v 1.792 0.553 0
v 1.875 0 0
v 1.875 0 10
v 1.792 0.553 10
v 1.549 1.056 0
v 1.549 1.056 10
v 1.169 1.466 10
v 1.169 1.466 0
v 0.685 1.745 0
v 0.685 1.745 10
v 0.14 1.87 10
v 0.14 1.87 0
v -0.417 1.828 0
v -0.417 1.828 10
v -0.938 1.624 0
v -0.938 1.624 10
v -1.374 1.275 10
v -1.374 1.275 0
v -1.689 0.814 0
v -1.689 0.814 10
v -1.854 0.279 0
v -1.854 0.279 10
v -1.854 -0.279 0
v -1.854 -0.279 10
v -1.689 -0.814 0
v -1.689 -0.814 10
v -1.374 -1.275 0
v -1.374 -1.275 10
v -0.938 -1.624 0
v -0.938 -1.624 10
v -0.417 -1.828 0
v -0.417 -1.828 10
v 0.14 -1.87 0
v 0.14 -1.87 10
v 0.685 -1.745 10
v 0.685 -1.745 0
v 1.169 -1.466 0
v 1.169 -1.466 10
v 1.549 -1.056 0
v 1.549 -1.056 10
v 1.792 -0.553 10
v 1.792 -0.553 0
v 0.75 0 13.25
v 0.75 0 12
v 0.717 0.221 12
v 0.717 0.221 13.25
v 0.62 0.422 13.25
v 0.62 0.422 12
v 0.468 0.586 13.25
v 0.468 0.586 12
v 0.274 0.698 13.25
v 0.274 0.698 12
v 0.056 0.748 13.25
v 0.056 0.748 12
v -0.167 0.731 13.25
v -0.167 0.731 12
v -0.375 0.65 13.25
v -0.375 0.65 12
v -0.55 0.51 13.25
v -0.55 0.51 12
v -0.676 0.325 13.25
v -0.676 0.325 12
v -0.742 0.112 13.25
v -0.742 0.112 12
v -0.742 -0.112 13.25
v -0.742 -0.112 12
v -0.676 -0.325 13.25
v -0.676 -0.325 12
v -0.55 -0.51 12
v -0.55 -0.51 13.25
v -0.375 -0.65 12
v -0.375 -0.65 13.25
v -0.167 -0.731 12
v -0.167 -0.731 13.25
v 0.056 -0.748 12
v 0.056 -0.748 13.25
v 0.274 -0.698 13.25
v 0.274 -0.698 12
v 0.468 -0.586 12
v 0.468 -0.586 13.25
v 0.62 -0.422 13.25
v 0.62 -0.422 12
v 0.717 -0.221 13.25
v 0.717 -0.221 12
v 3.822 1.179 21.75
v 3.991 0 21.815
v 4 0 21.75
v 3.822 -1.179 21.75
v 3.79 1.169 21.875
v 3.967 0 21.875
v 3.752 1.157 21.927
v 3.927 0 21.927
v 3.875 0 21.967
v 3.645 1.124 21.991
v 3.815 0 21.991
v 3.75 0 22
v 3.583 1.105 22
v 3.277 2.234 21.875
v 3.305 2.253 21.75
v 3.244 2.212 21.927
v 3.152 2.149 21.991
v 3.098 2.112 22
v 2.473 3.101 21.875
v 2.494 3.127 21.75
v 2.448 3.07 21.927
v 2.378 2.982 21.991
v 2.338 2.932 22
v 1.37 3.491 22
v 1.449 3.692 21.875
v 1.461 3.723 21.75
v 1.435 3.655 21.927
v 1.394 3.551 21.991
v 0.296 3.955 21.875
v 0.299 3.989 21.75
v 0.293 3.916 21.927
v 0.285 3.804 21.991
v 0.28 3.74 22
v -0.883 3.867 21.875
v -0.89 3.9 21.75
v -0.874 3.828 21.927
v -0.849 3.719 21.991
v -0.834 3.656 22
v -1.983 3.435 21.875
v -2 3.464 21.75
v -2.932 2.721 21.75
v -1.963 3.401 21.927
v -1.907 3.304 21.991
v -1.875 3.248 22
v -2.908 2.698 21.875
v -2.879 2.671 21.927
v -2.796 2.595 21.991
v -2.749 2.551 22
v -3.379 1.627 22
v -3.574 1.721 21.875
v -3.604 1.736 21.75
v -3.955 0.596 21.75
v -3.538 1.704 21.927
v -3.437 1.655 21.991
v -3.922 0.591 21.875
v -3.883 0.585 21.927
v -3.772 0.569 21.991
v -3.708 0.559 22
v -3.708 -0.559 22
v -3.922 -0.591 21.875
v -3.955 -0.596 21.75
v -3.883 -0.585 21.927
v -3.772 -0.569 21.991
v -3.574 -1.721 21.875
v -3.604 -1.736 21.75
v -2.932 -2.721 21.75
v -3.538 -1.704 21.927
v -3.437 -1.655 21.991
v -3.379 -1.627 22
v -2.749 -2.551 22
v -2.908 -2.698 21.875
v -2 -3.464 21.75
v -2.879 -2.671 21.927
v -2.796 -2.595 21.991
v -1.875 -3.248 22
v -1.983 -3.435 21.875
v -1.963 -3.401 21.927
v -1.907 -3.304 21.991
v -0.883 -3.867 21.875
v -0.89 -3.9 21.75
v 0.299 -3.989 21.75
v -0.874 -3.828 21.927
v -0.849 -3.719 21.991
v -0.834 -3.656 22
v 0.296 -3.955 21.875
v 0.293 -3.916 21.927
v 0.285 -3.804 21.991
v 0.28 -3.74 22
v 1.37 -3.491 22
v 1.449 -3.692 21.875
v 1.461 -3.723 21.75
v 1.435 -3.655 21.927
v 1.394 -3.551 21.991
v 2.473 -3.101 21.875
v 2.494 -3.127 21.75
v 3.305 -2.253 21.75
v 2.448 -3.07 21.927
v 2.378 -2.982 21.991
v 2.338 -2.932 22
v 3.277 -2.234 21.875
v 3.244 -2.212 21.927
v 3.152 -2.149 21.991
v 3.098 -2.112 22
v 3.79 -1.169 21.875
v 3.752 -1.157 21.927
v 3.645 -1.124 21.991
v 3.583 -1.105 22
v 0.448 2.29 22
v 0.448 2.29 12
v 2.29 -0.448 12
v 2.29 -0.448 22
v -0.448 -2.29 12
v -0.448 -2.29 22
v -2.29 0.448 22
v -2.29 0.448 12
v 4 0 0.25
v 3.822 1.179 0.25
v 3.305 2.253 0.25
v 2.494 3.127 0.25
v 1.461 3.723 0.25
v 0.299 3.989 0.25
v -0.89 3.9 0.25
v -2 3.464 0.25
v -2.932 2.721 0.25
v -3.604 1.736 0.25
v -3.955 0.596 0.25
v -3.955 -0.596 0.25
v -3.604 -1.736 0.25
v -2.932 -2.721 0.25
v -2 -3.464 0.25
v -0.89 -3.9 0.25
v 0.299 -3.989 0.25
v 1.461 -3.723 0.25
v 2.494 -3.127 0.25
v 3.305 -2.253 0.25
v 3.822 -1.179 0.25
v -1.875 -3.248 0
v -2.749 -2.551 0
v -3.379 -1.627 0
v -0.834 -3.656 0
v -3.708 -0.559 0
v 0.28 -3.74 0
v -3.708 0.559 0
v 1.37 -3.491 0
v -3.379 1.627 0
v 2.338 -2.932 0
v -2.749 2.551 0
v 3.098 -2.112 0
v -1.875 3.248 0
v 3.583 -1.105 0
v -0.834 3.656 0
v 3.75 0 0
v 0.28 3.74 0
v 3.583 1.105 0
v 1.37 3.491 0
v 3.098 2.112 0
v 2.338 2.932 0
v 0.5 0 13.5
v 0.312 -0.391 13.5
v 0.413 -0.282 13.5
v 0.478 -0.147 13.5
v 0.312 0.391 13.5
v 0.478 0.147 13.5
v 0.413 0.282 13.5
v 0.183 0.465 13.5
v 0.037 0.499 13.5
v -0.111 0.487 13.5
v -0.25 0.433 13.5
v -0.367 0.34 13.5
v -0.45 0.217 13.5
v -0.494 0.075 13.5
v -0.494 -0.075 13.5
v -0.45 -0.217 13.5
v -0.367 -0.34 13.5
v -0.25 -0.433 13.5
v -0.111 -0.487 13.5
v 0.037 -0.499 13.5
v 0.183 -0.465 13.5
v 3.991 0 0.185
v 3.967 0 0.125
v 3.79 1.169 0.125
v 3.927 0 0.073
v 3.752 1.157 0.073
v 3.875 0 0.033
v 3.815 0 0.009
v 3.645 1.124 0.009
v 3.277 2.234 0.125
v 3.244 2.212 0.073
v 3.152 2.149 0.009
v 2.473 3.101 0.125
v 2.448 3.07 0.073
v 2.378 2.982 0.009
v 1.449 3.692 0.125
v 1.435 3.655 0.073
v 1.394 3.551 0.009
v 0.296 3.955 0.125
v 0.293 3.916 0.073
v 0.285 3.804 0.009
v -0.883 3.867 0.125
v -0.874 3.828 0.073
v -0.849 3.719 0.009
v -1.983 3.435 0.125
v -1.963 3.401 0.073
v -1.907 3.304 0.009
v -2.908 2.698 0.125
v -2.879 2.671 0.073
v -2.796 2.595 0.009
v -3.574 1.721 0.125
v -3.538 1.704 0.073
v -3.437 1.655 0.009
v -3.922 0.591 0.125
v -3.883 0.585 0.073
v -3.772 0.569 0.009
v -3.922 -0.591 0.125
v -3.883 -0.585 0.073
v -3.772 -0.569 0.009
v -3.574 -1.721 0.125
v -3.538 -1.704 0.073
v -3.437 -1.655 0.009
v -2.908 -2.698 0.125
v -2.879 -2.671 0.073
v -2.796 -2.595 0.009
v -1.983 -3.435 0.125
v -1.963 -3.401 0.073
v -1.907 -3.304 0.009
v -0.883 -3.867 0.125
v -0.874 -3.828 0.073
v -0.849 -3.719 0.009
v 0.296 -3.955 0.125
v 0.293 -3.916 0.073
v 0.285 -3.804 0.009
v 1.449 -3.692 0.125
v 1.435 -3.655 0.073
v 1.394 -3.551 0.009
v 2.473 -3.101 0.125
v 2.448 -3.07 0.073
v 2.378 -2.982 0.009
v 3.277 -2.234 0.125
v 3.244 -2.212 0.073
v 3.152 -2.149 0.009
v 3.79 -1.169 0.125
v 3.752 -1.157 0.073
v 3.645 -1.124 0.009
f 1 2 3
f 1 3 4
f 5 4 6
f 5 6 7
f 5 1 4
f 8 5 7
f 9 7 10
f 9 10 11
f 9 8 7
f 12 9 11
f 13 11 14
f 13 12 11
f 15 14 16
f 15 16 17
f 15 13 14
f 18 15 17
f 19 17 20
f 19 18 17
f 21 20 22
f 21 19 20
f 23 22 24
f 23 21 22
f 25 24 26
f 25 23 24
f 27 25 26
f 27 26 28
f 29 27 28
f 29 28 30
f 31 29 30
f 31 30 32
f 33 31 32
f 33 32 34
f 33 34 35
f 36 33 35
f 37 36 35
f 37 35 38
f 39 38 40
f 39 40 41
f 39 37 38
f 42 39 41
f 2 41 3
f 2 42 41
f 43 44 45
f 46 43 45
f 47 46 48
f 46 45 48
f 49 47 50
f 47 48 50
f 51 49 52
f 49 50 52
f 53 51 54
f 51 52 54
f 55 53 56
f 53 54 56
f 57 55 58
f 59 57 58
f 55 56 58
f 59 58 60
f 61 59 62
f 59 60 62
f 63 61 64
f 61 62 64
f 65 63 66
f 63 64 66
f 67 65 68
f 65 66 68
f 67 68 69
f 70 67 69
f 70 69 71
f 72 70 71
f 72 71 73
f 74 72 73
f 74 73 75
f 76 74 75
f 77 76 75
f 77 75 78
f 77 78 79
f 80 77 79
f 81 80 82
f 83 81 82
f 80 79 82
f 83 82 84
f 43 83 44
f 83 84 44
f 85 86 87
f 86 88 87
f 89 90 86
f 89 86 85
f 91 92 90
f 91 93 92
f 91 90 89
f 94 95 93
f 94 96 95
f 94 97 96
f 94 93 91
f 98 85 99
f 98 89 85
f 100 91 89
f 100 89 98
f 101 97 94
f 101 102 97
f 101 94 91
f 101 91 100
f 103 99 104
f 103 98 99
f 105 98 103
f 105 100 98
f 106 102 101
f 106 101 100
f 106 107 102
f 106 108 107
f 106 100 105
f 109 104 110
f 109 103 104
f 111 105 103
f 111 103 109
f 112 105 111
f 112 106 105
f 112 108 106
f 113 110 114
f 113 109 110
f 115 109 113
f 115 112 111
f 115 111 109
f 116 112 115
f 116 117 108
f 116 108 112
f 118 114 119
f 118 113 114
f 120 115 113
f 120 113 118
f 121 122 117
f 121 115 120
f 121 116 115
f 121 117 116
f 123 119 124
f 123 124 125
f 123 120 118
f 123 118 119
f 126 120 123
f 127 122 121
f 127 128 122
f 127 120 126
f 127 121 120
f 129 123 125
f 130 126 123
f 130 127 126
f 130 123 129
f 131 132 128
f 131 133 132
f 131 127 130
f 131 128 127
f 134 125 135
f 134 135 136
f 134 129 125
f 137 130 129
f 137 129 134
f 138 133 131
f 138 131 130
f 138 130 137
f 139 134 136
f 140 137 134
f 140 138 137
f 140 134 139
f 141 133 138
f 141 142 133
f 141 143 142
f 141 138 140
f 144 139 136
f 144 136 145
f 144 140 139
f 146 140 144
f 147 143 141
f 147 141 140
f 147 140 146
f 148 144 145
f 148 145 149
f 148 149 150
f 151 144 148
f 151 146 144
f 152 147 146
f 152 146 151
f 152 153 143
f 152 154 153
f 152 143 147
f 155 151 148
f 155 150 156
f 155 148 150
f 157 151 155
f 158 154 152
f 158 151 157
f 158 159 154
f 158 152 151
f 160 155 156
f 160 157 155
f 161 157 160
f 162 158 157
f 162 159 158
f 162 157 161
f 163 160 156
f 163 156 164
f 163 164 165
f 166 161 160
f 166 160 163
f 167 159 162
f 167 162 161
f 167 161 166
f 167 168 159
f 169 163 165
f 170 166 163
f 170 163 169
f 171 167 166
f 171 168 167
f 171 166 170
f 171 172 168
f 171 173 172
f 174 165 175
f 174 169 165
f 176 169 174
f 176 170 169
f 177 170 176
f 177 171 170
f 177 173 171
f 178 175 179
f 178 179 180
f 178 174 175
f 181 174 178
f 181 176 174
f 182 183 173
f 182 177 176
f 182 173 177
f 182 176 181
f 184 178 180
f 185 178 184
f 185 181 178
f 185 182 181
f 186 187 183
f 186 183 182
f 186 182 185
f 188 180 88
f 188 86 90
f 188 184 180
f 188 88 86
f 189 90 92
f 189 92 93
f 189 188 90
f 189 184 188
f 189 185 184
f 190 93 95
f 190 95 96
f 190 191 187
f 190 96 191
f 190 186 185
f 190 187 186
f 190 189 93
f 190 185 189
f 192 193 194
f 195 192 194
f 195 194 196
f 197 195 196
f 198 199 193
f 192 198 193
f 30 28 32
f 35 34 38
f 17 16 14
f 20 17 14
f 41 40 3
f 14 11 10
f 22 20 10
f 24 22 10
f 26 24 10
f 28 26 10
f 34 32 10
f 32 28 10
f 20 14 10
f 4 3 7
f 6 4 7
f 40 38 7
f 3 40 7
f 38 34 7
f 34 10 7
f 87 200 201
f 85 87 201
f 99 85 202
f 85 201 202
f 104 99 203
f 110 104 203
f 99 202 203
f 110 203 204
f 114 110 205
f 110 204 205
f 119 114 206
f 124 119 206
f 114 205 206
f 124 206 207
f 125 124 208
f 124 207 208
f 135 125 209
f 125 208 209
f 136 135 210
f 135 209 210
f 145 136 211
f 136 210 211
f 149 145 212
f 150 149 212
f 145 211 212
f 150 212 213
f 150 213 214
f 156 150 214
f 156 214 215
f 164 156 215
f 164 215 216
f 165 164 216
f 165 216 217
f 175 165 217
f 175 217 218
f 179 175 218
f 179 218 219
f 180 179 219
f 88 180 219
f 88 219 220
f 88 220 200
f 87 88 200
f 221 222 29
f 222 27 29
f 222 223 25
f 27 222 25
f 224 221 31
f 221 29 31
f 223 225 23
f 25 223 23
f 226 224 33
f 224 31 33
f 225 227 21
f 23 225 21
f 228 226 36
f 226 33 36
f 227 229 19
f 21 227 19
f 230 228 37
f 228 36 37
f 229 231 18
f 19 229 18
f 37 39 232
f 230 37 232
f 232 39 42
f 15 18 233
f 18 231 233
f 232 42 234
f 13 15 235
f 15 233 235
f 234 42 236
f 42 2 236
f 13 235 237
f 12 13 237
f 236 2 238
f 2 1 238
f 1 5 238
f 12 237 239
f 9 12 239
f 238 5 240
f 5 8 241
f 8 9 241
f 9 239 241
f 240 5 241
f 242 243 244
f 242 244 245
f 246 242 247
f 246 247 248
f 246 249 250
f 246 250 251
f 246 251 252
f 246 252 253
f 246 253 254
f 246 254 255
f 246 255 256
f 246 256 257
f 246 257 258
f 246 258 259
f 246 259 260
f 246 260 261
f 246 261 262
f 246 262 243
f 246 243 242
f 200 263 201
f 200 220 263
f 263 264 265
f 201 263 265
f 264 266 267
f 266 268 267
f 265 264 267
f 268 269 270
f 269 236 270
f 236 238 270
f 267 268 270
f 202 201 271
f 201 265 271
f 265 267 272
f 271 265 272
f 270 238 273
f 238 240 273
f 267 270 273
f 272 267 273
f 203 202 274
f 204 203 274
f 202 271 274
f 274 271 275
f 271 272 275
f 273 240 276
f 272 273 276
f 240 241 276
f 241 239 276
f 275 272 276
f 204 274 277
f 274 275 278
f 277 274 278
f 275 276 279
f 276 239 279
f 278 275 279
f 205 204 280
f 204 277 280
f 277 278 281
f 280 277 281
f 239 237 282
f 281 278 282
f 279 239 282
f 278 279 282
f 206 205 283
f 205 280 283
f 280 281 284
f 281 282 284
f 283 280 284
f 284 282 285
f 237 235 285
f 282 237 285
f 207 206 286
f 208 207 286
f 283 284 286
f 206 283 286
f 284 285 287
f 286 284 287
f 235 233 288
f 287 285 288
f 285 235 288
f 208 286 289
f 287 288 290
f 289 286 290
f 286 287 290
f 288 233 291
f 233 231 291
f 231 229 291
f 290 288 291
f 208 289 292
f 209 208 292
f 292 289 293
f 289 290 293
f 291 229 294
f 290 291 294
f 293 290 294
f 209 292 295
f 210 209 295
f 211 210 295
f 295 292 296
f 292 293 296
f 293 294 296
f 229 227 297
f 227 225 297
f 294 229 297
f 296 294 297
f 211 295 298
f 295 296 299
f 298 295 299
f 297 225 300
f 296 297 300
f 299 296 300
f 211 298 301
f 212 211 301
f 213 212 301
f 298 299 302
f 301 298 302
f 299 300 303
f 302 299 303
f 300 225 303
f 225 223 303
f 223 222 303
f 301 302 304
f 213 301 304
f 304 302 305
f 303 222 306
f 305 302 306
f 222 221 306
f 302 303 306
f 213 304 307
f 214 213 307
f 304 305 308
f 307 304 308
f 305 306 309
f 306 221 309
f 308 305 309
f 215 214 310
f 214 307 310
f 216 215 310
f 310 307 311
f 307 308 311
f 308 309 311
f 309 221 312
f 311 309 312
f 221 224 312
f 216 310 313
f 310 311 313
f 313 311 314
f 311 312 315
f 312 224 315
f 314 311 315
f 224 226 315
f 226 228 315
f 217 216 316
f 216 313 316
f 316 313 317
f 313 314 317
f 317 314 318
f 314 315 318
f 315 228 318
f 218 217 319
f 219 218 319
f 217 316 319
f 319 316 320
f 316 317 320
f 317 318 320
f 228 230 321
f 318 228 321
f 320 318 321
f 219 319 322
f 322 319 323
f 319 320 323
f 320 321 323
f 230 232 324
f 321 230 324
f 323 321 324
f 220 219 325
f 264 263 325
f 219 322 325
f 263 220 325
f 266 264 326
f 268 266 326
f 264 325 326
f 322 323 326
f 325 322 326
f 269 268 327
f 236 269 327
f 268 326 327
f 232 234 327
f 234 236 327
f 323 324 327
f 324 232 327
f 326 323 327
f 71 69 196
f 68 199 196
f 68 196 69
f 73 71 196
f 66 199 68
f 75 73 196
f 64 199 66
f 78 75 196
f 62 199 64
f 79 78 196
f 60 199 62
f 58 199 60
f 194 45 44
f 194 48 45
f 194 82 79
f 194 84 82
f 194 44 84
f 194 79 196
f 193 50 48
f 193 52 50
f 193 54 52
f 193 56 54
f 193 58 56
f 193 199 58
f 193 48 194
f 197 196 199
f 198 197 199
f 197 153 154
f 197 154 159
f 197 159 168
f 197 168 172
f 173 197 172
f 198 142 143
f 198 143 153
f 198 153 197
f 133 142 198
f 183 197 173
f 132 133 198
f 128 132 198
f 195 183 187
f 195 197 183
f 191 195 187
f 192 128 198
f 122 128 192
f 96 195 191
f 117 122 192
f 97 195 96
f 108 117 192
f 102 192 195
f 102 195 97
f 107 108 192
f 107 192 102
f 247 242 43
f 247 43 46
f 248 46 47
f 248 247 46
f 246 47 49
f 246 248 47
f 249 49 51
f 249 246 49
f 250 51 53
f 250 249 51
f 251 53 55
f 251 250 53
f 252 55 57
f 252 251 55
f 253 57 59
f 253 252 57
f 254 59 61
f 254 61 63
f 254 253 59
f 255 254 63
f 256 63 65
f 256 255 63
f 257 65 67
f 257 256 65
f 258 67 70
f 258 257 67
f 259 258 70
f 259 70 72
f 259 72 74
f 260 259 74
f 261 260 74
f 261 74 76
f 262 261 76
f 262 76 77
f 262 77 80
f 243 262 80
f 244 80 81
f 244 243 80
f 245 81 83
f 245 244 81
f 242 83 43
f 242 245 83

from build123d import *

# Parameters (mm, degrees)
F0_R     = 4
F0_R_2   = 1.875
F1_DEPTH = 10
F2_R     = 4
F3_DEPTH = 2
F4_R     = 0.75
F5_DEPTH = 1.5
F6_SIZE  = 0.25
F7_R     = 4
F8_DEPTH = 10
F9_R     = 0.25
F10_R    = 0.25


with BuildPart() as f1:
    # F0 (on Top) → F1 (new body)
    with BuildSketch(Plane.XY):
        Circle(F0_R)
        Circle(F0_R_2, mode=Mode.SUBTRACT)
    extrude(amount=F1_DEPTH)

    # F2 (on face) → F3 (join)
    with BuildSketch(Plane.XY.offset(10)):
        Circle(F2_R)
    extrude(amount=F3_DEPTH)

    # F4 (on face) → F5 (join)
    with BuildSketch(Plane.XY.offset(12)):
        Circle(F4_R)
    extrude(amount=F5_DEPTH)

    # F6
    f6_edges = [f1.edges().sort_by_distance(p)[0] for p in [
        (-0.75, 0, 13.5),
    ]]
    chamfer(f6_edges, length=F6_SIZE)

    # F7 (on face) → F8 (join)
    with BuildSketch(Plane.XY.offset(12)):
        Circle(F7_R)
        Polygon((-0.447693, -2.290151), (-2.290151, 0.447693), (0.447693, 2.290151), (2.290151, -0.447693), align=None, mode=Mode.SUBTRACT)
    extrude(amount=F8_DEPTH)

    # F9
    f9_edges = [f1.edges().sort_by_distance(p)[0] for p in [
        (-4, 0, 22),
    ]]
    fillet(f9_edges, radius=F9_R)

    # F10
    f10_edges = [f1.edges().sort_by_distance(p)[0] for p in [
        (-4, 0, 0),
    ]]
    fillet(f10_edges, radius=F10_R)


solid = f1.part
